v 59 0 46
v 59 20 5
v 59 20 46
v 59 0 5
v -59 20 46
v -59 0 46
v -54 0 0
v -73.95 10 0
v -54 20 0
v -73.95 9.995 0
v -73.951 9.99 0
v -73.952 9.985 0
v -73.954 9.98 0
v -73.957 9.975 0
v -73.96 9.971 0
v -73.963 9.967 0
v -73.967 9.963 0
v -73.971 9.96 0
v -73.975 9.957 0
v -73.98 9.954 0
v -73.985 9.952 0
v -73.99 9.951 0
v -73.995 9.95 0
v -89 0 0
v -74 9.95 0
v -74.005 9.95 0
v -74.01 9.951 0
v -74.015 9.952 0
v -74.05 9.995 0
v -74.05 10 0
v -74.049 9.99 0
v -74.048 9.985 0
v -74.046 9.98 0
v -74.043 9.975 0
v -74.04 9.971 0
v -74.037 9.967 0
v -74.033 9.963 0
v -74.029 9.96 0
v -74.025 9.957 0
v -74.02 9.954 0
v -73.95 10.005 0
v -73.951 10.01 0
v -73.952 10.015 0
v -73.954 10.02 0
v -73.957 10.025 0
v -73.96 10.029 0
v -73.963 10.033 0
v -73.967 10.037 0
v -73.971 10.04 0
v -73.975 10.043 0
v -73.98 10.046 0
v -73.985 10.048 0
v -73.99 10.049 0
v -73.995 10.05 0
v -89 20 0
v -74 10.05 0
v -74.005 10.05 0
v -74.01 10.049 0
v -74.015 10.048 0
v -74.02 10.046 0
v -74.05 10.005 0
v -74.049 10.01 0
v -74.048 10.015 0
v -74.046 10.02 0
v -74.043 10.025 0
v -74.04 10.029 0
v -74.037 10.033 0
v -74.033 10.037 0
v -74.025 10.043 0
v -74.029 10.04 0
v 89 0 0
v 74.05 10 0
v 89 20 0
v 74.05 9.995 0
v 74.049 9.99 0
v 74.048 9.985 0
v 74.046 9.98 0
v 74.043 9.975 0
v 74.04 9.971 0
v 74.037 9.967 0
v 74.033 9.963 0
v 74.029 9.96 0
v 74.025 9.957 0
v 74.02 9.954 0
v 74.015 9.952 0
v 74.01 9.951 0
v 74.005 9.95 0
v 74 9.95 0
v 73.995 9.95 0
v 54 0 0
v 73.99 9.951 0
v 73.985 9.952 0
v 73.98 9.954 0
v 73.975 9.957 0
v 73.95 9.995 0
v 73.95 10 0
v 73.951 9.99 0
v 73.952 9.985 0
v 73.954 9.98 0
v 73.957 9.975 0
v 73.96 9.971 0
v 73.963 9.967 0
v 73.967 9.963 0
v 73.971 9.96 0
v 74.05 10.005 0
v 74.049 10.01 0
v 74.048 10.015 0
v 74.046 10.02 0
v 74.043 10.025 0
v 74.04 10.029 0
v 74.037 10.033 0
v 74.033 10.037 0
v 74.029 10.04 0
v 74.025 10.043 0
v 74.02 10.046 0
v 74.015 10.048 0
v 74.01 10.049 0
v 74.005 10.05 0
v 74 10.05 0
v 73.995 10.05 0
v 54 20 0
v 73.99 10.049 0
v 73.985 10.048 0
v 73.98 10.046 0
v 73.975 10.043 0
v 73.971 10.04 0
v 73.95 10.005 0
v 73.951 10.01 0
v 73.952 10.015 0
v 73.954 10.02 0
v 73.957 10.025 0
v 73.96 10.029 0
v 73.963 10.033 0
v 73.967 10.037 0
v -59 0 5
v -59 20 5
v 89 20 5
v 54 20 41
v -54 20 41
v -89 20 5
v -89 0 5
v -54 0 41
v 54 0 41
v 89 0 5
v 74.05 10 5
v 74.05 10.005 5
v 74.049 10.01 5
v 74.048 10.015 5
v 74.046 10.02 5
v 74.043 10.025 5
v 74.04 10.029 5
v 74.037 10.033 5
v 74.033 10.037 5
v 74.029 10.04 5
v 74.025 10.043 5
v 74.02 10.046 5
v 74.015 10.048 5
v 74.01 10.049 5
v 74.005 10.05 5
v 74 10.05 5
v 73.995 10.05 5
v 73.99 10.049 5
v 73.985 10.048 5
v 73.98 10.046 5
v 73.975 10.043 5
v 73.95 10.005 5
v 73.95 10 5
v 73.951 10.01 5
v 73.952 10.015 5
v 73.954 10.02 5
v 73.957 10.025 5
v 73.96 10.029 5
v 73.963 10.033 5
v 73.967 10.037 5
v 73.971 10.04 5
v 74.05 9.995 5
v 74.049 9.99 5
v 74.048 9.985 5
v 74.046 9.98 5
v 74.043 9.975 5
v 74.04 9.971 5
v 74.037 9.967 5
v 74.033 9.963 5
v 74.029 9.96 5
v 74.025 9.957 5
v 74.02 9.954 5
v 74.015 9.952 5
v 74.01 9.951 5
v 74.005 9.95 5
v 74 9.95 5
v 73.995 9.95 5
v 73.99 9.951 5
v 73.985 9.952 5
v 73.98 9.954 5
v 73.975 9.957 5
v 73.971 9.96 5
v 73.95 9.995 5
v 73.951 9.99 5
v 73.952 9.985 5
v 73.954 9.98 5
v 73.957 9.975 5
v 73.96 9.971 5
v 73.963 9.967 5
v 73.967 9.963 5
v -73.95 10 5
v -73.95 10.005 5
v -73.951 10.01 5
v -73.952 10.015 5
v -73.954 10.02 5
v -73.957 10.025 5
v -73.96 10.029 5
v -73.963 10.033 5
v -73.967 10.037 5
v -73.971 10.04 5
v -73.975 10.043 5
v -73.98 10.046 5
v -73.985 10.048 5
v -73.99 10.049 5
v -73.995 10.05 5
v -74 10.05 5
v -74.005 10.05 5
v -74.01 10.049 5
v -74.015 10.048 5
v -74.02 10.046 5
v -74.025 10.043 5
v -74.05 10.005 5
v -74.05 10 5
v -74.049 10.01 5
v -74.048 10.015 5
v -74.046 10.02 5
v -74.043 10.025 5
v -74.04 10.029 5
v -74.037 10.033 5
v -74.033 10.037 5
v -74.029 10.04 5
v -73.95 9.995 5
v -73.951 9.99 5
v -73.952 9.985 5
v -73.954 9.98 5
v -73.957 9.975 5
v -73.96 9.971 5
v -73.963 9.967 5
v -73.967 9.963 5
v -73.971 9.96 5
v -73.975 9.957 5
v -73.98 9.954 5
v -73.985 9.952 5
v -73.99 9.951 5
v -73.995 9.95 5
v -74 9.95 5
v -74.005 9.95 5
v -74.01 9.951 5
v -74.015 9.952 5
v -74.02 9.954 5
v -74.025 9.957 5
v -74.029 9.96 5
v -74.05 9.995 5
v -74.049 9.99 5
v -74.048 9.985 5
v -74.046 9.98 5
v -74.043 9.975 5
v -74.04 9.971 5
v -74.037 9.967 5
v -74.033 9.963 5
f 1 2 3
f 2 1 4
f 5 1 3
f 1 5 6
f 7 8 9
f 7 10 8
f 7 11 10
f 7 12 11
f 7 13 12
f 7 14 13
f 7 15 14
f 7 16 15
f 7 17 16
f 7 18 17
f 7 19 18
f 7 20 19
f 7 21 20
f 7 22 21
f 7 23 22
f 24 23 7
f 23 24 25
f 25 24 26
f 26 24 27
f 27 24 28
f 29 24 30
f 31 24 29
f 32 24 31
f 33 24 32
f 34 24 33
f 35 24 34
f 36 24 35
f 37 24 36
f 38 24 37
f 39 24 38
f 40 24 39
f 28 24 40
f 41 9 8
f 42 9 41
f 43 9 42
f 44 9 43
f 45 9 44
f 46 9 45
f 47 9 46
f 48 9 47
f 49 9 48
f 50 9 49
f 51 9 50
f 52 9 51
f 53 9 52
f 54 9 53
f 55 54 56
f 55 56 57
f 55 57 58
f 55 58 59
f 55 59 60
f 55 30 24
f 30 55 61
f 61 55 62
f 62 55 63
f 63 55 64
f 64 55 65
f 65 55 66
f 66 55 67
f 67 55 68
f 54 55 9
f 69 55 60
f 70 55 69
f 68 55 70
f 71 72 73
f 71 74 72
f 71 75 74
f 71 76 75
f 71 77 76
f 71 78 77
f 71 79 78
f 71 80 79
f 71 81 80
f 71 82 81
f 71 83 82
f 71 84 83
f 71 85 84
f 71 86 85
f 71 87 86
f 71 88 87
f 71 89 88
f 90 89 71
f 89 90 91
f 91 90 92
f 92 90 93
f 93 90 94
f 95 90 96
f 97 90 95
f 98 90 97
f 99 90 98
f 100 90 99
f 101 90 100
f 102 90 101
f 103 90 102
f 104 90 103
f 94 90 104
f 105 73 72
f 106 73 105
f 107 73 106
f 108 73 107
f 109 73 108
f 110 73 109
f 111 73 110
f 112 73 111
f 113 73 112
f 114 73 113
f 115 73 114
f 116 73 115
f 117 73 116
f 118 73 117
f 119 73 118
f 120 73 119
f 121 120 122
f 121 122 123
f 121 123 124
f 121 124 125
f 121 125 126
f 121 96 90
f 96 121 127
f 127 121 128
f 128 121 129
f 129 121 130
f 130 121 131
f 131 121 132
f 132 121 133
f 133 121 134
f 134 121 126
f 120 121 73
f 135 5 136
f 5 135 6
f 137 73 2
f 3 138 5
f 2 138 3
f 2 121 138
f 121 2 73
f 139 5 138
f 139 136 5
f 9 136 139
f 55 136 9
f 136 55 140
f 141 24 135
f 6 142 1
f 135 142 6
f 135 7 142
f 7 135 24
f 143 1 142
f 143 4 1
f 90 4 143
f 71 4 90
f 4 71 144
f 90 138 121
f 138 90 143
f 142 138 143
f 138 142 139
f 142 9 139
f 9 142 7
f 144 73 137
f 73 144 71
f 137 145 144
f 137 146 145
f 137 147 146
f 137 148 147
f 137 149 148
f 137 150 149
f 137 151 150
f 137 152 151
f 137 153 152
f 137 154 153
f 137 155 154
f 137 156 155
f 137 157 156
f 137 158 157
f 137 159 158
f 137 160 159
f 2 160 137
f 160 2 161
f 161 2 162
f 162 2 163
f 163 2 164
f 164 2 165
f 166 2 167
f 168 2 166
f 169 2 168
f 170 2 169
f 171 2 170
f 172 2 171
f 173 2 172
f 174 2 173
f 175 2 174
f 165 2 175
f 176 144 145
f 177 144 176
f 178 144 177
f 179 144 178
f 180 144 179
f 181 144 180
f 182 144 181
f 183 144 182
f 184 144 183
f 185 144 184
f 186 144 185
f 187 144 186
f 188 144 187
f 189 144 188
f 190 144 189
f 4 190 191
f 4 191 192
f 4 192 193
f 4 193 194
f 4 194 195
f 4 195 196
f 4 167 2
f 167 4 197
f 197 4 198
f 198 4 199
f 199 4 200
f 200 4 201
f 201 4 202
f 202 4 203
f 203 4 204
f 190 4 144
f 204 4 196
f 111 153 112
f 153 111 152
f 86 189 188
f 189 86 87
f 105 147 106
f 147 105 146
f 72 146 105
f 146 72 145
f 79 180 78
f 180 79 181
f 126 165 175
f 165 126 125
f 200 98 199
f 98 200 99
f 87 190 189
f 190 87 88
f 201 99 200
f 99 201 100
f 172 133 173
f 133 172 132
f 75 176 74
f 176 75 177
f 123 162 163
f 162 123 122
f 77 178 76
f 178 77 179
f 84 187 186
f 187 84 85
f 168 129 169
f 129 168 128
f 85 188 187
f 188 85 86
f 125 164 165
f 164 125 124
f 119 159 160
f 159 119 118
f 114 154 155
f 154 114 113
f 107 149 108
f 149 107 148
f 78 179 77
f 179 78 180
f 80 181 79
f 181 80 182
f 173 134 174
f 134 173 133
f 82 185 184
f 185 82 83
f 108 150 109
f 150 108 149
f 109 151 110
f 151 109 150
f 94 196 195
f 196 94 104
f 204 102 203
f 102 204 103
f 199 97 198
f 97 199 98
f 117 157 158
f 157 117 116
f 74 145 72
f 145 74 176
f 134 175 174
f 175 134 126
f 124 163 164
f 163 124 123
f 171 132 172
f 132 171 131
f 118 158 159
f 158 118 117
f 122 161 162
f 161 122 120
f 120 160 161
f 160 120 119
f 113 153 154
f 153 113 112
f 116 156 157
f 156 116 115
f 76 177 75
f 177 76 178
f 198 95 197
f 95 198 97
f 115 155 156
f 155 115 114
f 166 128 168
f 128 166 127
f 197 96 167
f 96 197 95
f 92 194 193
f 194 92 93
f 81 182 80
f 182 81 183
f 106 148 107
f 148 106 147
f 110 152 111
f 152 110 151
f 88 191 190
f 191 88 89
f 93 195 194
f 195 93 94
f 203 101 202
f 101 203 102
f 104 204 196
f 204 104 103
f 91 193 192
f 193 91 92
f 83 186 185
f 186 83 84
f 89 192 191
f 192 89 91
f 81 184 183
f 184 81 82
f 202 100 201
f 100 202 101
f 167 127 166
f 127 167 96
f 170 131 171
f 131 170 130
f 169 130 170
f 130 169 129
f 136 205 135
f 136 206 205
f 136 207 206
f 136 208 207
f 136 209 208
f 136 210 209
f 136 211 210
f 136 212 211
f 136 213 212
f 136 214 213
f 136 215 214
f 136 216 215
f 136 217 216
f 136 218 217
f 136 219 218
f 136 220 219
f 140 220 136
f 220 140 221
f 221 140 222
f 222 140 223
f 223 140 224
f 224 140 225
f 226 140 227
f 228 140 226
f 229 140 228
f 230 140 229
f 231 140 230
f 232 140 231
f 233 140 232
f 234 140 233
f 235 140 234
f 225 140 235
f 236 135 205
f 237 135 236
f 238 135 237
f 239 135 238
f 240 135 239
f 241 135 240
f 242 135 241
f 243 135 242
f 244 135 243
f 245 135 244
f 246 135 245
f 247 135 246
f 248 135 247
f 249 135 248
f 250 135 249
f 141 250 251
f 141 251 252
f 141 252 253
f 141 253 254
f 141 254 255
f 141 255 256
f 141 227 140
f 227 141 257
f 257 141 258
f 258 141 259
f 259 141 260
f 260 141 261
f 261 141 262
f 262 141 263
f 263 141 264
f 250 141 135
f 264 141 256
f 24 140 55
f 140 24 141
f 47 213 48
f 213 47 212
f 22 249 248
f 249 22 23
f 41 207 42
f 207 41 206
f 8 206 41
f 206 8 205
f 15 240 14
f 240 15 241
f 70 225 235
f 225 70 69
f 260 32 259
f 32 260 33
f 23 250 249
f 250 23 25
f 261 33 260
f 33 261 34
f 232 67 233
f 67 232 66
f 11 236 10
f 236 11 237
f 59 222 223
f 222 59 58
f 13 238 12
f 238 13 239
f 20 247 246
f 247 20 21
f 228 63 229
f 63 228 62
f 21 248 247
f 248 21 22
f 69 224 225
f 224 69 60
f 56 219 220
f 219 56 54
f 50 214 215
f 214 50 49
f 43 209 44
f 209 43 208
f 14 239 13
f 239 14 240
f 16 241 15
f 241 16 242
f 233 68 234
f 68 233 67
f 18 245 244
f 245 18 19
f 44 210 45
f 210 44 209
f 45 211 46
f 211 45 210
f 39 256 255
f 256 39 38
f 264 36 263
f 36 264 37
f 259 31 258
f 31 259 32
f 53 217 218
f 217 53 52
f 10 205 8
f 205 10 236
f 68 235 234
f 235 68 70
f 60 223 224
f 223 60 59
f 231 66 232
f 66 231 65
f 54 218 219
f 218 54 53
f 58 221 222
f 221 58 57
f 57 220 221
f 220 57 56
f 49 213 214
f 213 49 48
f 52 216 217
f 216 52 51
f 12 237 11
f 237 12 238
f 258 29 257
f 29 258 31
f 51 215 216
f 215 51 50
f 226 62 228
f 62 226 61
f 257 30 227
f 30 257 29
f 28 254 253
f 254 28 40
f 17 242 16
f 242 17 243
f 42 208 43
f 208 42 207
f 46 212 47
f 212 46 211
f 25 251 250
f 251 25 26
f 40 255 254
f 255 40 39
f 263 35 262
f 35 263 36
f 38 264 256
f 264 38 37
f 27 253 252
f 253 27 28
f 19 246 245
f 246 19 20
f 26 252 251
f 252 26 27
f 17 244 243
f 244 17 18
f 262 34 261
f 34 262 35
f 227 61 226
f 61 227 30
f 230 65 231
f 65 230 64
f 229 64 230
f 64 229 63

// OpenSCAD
// file: ../Household/references.scad
// Size
//Naming
// _PT = printable
// _ES = exact size
// _IS = insertable with force but no gaps

//--------------cables  (CB)

//----Ethernet (rj45)

//not mesured yet
CB_RJ45_Diameter_ES=4; 

//--------------threaded rod  (TR)

//----M5

TR_M5_Diameter_ES = 5.8;
//for a hole 
TR_M5_Diamater_IS = 6;
TR_M5_Diamater_PT = 7;


//----M10

TR_M10_Diameter_ES = 9.6;
//for a hole 
TR_M10_Diamater_IS = 10;
TR_M10_Diamater_PT = 12;

//--------------heat insert (HT)

HT_Diameter_ES = 5;
HT_Diameter_PT = 6;
HT_height_ES = 4;
HT_height_PT = 5;

//--------------Screw (SC)
//----M3


module body_M3(height_input){
    cylinder(d=SC_M3_Diameter_PT,h=height_input,$fn=60);
    
    }
    
SC_M3_Diameter_ES = 2.96;
SC_M3_Head_Diameter_ES = 5.90;
SC_M3_Head_Height_ES = 2.32;
//for a hole 
SC_M3_Diameter_PT = 4; 


//----M5

SC_M5_Diameter_ES = 4.86;
SC_M5_Head_Diameter_ES = 9.24;
SC_M5_Head_Height_ES = 3.0;
//for a hole 
SC_M5_Diameter_IS = 5;
SC_M5_Diameter_PT = 5.2; //inconnu pour le moment
SC_M5_Head_Diameter_PT = 11;


screw_dictionary = [
  ["example", ["PT", "Diameter side to side","Head_Diameter","Head_Height"],["ES", "Diameter side to side","Head_Diameter","Head_Height"]],
  ["m3", ["PT", 0.1,10],["ES", SC_M3_Diameter_ES,SC_M3_Head_Diameter_ES,SC_M3_Head_Height_ES],],
  ["m5", ["PT", 0.1,10],["ES", SC_M5_Diameter_ES,SC_M5_Head_Diameter_ES,SC_M5_Head_Height_ES],],
];

    
module screw(type_of_screw,type_of_dimension="undefinied",height_input="undefinied"){
    //if type of dimension is undefined, take a default value
    dimension_input = (type_of_dimension == "undefined") ? "PT" : type_of_dimension;

    //retrieving from dictionary using function
    chosen_spec = double_selector(screw_dictionary,type_of_screw,dimension_input);  
    
    //determine nut diameter
    screw_diameter = chosen_spec[0][1];
    
    //if screw height is undefined, take the value from the dict
    object_height = (height_input == "undefined") ? chosen_spec[0][3] : height_input;

    //create the cylinder
    cylinder(d=screw_diameter,h=object_height,$fn=60);
    
    }
 //example     
 //  screw("m3","ES",10);;   


//--------------Nut Bolt (NB)



module nut_M3(height_input){
    cylinder(d=NB_M3_Diameter_C2C_PT,h=height_input,$fn=6);
    
    }

module nut_M5(height_input){
    cylinder(d=NB_M5_Diameter_C2C_PT,h=height_input,$fn=6);
    
    }
    


//----M3
// Side to side = from 2 paralelle faces S2S
// corner to corner = from 2 corners C2C


NB_M3_Diameter_S2S_ES = 5.30;
NB_M3_Diameter_C2C_ES = 6.0;

NB_M3_Diameter_S2S_PT = 6.30; //reducing as well
NB_M3_Diameter_C2C_PT = 7.0; //8.0 was too much 

NB_M5_Diameter_C2C_ES = 8.9;

NB_M5_Diameter_C2C_PT = 10.5; //8.0 was too much 

nut_dictionary = [
  ["example", ["PT", "Diameter side to side","Nut_Height"],["ES", "Diameter side to side","Nut_Height"]],
  ["m3", ["PT", NB_M3_Diameter_S2S_PT,10],["ES", NB_M3_Diameter_S2S_ES,10],],
  ["m5", ["PT", 10.2,10],["ES", 9.2,10],],
];

module nut(type_of_nut,type_of_dimension="undefinied",height_input="undefinied"){
    //if type of dimension is undefined, take a default value
    dimension_input = (type_of_dimension == "undefined") ? "PT" : type_of_dimension;

    //retrieving from dictionary using function
    chosen_spec = double_selector(nut_dictionary,type_of_nut,dimension_input);  
    echo(chosen_spec);
    //determine nut diameter
    nut_diameter = chosen_spec[0][1];
    
    //if nut height is undefined, take the value from the dict
    object_height = (height_input == "undefined") ? chosen_spec[0][2] : height_input;

    //create the cylinder
    cylinder(d=nut_diameter ,h=object_height,$fn=6);
    
    
   }
   
 //example
 // nut(type_of_nut="m5",type_of_dimension="ES",height_input=5);

//--------------Zip ties (ZT)

//Big zip ties I got    

ZT_length_ES = 300;
ZT_width_ES = 4.8;
ZT_height_ES = 1;

ZT_width_PT = 7;
ZT_height_PT = 3;

//--------------Velcro tape (VT)



VT_length_ES = 300;
VT_width_ES = 20;
VT_height_ES = 1;

VT_width_PT = 22;
VT_height_PT = 3;



//--------------Switch (SW)
//switch from castorama 
SW_length_ES = 13;
SW_width_ES = 8;
SW_height_ES = 14;

SW_length_PT = 15;
SW_width_PT = 10;
SW_height_PT = 16;


//switch from aliexpress
SW_AL_tube_width_ES = 5.7;
SW_AL_tube_width_PT = 7;

module custom_cylinder_switch(translated_position_X, translated_position_Y,translated_position_Z,heigh_input) {
    translate([translated_position_X, translated_position_Y, translated_position_Z]){ 
        rotate([90,0,0]){
            cylinder(d=SW_AL_tube_width_PT, h=heigh_input, $fn=30);
        }
    }
}
module custom_cylinder(rotate_input,translate_input,diameter_object,height_object){
    translate(translate_input){
        rotate(rotate_input){
            cylinder(d=diameter_object,h=height_object,$fn=60);
        }
    }
}

//--------------generic connectors (GC)
// USB C (USB-C)
GC_USB_C_length_ES = 7.3;
GC_USB_C_width_ES = 8.8;
GC_USB_C_height_ES = 3;

module USB_C(rotate_input,translate_input){
    translate(translate_input){
    rotate(rotate_input){
        hull(){
    cylinder(d=GC_USB_C_height_ES,h=GC_USB_C_length_ES,$fn=60);
translate([0,GC_USB_C_width_ES-GC_USB_C_height_ES,0]){
    cylinder(d=GC_USB_C_height_ES,h=GC_USB_C_length_ES,$fn=60);
}
}
    }
}
}

//--------------battery from vapes (BV)

//vapes crystal pro battery (CP)
BV_CP_length_ES = 34;
BV_CP_width_ES = 20;
BV_CP_height_ES = BV_CP_width_ES; //(because it's a cylinder)

BV_CP_length_PT = 37;
BV_CP_width_PT = 22;
BV_CP_height_PT = BV_CP_width_ES; //(because it's a cylinder)

//dimension list [legnth, width, height]
//BV_CP_PT=[37,22,22];
BV_CP_PT=[BV_CP_length_PT,BV_CP_width_PT,BV_CP_height_PT];

module vapes_battery(input_list,rotate_input,translate_input){
translate(translate_input){
    rotate(rotate_input){
        color("green")cylinder(d=input_list[1],h=input_list[0],$fn=60);
    }
    }
}


//--------------battery charger (BC)
//Board Charger TP4056 Module  (TP)

//https://www.az-delivery.uk/cdn/shop/products/tp4056-batterieladungsmodul-usb-typ-c-schutzschaltung-led-anzeigen-fur-ihre-li-ion-oder-lipo-einzelzellenbatterien-126337.jpg?v=1694708173


BC_TP_length_ES = 28;
BC_TP_full_length_ES = 28; //usb C end included
BC_TP_width_ES = 17;
BC_TP_height_ES = 1.3; //without USB C
BC_TP_full_height_ES = 5; //with USB C



//usb C connector position
BC_TP_width_from_side_ES = 8.44;//center of USB C connector from bottom (view from the top )
BC_TP_height_from_bottom_ES = 3.4;//center of USB C connector from bottom (view from the top )
BC_TP_negative_length_ES = 2;//center of USB C connector from bottom 

module battery_charger(rotate_input,translate_input){
    translate(translate_input){
    rotate(rotate_input){
        color("green"){
            cube([BC_TP_full_length_ES,BC_TP_width_ES,BC_TP_height_ES]);

                rotate_array_USB_C=[0,90,0];
    translate_array_USB_C=[-BC_TP_negative_length_ES,BC_TP_width_ES/2-(GC_USB_C_width_ES-GC_USB_C_height_ES)/2,GC_USB_C_height_ES/2+BC_TP_height_ES];
    
    USB_C(rotate_array_USB_C,translate_array_USB_C);

            
            }
    }
}
    
    }


//https://www.alectrofag.co.uk/cdn/shop/files/Hayati_Pro_Max_4000_Puffs_Disposable_Vape.jpg?v=1725012272




//https://d138zd1ktt9iqe.cloudfront.net/media/seo_landing_files/length-width-height-01-1646654708.png


//--------------Function    
    
function single_selector(dictionary,item) = [
  for (spec = dictionary)
  if (spec[0] == item)
  spec
];

function double_selector(dictionary,item,dimension) = [
  for (spec = dictionary)
    if (spec[0] == item)
        for (dim = spec)
            if (dim[0] == dimension)
                dim
];
// main file
include <../Household/references.scad>


psu_height=41; 
psu_width=108;

object_length=20;
object_thickness = 5;

holes_bits_length = 30;

module object(){
    color("red"){
        translate([-(psu_width+object_thickness*2)/2,0,0]){
            cube([psu_width+object_thickness*2,object_length,psu_height+object_thickness]);
}}}

module psu(){
    color("green"){
        translate([-psu_width/2,0,0]){
            cube([psu_width,object_length,psu_height]);
}}}

module holes_bits(){
    difference(){
        color("blue"){
            cube([holes_bits_length,object_length,object_thickness]);}
        color("purple"){
            translate([holes_bits_length/2,object_length/2,0]){screw("m5","PT",object_thickness);}
        }
    }}

module main(){
    difference(){
        object();
        psu();
    }
    translate([(psu_width+object_thickness*2)/2,0,0]){holes_bits();};
    translate([-(psu_width+object_thickness*2)/2-holes_bits_length,0,0]){holes_bits();};

    }

main();
